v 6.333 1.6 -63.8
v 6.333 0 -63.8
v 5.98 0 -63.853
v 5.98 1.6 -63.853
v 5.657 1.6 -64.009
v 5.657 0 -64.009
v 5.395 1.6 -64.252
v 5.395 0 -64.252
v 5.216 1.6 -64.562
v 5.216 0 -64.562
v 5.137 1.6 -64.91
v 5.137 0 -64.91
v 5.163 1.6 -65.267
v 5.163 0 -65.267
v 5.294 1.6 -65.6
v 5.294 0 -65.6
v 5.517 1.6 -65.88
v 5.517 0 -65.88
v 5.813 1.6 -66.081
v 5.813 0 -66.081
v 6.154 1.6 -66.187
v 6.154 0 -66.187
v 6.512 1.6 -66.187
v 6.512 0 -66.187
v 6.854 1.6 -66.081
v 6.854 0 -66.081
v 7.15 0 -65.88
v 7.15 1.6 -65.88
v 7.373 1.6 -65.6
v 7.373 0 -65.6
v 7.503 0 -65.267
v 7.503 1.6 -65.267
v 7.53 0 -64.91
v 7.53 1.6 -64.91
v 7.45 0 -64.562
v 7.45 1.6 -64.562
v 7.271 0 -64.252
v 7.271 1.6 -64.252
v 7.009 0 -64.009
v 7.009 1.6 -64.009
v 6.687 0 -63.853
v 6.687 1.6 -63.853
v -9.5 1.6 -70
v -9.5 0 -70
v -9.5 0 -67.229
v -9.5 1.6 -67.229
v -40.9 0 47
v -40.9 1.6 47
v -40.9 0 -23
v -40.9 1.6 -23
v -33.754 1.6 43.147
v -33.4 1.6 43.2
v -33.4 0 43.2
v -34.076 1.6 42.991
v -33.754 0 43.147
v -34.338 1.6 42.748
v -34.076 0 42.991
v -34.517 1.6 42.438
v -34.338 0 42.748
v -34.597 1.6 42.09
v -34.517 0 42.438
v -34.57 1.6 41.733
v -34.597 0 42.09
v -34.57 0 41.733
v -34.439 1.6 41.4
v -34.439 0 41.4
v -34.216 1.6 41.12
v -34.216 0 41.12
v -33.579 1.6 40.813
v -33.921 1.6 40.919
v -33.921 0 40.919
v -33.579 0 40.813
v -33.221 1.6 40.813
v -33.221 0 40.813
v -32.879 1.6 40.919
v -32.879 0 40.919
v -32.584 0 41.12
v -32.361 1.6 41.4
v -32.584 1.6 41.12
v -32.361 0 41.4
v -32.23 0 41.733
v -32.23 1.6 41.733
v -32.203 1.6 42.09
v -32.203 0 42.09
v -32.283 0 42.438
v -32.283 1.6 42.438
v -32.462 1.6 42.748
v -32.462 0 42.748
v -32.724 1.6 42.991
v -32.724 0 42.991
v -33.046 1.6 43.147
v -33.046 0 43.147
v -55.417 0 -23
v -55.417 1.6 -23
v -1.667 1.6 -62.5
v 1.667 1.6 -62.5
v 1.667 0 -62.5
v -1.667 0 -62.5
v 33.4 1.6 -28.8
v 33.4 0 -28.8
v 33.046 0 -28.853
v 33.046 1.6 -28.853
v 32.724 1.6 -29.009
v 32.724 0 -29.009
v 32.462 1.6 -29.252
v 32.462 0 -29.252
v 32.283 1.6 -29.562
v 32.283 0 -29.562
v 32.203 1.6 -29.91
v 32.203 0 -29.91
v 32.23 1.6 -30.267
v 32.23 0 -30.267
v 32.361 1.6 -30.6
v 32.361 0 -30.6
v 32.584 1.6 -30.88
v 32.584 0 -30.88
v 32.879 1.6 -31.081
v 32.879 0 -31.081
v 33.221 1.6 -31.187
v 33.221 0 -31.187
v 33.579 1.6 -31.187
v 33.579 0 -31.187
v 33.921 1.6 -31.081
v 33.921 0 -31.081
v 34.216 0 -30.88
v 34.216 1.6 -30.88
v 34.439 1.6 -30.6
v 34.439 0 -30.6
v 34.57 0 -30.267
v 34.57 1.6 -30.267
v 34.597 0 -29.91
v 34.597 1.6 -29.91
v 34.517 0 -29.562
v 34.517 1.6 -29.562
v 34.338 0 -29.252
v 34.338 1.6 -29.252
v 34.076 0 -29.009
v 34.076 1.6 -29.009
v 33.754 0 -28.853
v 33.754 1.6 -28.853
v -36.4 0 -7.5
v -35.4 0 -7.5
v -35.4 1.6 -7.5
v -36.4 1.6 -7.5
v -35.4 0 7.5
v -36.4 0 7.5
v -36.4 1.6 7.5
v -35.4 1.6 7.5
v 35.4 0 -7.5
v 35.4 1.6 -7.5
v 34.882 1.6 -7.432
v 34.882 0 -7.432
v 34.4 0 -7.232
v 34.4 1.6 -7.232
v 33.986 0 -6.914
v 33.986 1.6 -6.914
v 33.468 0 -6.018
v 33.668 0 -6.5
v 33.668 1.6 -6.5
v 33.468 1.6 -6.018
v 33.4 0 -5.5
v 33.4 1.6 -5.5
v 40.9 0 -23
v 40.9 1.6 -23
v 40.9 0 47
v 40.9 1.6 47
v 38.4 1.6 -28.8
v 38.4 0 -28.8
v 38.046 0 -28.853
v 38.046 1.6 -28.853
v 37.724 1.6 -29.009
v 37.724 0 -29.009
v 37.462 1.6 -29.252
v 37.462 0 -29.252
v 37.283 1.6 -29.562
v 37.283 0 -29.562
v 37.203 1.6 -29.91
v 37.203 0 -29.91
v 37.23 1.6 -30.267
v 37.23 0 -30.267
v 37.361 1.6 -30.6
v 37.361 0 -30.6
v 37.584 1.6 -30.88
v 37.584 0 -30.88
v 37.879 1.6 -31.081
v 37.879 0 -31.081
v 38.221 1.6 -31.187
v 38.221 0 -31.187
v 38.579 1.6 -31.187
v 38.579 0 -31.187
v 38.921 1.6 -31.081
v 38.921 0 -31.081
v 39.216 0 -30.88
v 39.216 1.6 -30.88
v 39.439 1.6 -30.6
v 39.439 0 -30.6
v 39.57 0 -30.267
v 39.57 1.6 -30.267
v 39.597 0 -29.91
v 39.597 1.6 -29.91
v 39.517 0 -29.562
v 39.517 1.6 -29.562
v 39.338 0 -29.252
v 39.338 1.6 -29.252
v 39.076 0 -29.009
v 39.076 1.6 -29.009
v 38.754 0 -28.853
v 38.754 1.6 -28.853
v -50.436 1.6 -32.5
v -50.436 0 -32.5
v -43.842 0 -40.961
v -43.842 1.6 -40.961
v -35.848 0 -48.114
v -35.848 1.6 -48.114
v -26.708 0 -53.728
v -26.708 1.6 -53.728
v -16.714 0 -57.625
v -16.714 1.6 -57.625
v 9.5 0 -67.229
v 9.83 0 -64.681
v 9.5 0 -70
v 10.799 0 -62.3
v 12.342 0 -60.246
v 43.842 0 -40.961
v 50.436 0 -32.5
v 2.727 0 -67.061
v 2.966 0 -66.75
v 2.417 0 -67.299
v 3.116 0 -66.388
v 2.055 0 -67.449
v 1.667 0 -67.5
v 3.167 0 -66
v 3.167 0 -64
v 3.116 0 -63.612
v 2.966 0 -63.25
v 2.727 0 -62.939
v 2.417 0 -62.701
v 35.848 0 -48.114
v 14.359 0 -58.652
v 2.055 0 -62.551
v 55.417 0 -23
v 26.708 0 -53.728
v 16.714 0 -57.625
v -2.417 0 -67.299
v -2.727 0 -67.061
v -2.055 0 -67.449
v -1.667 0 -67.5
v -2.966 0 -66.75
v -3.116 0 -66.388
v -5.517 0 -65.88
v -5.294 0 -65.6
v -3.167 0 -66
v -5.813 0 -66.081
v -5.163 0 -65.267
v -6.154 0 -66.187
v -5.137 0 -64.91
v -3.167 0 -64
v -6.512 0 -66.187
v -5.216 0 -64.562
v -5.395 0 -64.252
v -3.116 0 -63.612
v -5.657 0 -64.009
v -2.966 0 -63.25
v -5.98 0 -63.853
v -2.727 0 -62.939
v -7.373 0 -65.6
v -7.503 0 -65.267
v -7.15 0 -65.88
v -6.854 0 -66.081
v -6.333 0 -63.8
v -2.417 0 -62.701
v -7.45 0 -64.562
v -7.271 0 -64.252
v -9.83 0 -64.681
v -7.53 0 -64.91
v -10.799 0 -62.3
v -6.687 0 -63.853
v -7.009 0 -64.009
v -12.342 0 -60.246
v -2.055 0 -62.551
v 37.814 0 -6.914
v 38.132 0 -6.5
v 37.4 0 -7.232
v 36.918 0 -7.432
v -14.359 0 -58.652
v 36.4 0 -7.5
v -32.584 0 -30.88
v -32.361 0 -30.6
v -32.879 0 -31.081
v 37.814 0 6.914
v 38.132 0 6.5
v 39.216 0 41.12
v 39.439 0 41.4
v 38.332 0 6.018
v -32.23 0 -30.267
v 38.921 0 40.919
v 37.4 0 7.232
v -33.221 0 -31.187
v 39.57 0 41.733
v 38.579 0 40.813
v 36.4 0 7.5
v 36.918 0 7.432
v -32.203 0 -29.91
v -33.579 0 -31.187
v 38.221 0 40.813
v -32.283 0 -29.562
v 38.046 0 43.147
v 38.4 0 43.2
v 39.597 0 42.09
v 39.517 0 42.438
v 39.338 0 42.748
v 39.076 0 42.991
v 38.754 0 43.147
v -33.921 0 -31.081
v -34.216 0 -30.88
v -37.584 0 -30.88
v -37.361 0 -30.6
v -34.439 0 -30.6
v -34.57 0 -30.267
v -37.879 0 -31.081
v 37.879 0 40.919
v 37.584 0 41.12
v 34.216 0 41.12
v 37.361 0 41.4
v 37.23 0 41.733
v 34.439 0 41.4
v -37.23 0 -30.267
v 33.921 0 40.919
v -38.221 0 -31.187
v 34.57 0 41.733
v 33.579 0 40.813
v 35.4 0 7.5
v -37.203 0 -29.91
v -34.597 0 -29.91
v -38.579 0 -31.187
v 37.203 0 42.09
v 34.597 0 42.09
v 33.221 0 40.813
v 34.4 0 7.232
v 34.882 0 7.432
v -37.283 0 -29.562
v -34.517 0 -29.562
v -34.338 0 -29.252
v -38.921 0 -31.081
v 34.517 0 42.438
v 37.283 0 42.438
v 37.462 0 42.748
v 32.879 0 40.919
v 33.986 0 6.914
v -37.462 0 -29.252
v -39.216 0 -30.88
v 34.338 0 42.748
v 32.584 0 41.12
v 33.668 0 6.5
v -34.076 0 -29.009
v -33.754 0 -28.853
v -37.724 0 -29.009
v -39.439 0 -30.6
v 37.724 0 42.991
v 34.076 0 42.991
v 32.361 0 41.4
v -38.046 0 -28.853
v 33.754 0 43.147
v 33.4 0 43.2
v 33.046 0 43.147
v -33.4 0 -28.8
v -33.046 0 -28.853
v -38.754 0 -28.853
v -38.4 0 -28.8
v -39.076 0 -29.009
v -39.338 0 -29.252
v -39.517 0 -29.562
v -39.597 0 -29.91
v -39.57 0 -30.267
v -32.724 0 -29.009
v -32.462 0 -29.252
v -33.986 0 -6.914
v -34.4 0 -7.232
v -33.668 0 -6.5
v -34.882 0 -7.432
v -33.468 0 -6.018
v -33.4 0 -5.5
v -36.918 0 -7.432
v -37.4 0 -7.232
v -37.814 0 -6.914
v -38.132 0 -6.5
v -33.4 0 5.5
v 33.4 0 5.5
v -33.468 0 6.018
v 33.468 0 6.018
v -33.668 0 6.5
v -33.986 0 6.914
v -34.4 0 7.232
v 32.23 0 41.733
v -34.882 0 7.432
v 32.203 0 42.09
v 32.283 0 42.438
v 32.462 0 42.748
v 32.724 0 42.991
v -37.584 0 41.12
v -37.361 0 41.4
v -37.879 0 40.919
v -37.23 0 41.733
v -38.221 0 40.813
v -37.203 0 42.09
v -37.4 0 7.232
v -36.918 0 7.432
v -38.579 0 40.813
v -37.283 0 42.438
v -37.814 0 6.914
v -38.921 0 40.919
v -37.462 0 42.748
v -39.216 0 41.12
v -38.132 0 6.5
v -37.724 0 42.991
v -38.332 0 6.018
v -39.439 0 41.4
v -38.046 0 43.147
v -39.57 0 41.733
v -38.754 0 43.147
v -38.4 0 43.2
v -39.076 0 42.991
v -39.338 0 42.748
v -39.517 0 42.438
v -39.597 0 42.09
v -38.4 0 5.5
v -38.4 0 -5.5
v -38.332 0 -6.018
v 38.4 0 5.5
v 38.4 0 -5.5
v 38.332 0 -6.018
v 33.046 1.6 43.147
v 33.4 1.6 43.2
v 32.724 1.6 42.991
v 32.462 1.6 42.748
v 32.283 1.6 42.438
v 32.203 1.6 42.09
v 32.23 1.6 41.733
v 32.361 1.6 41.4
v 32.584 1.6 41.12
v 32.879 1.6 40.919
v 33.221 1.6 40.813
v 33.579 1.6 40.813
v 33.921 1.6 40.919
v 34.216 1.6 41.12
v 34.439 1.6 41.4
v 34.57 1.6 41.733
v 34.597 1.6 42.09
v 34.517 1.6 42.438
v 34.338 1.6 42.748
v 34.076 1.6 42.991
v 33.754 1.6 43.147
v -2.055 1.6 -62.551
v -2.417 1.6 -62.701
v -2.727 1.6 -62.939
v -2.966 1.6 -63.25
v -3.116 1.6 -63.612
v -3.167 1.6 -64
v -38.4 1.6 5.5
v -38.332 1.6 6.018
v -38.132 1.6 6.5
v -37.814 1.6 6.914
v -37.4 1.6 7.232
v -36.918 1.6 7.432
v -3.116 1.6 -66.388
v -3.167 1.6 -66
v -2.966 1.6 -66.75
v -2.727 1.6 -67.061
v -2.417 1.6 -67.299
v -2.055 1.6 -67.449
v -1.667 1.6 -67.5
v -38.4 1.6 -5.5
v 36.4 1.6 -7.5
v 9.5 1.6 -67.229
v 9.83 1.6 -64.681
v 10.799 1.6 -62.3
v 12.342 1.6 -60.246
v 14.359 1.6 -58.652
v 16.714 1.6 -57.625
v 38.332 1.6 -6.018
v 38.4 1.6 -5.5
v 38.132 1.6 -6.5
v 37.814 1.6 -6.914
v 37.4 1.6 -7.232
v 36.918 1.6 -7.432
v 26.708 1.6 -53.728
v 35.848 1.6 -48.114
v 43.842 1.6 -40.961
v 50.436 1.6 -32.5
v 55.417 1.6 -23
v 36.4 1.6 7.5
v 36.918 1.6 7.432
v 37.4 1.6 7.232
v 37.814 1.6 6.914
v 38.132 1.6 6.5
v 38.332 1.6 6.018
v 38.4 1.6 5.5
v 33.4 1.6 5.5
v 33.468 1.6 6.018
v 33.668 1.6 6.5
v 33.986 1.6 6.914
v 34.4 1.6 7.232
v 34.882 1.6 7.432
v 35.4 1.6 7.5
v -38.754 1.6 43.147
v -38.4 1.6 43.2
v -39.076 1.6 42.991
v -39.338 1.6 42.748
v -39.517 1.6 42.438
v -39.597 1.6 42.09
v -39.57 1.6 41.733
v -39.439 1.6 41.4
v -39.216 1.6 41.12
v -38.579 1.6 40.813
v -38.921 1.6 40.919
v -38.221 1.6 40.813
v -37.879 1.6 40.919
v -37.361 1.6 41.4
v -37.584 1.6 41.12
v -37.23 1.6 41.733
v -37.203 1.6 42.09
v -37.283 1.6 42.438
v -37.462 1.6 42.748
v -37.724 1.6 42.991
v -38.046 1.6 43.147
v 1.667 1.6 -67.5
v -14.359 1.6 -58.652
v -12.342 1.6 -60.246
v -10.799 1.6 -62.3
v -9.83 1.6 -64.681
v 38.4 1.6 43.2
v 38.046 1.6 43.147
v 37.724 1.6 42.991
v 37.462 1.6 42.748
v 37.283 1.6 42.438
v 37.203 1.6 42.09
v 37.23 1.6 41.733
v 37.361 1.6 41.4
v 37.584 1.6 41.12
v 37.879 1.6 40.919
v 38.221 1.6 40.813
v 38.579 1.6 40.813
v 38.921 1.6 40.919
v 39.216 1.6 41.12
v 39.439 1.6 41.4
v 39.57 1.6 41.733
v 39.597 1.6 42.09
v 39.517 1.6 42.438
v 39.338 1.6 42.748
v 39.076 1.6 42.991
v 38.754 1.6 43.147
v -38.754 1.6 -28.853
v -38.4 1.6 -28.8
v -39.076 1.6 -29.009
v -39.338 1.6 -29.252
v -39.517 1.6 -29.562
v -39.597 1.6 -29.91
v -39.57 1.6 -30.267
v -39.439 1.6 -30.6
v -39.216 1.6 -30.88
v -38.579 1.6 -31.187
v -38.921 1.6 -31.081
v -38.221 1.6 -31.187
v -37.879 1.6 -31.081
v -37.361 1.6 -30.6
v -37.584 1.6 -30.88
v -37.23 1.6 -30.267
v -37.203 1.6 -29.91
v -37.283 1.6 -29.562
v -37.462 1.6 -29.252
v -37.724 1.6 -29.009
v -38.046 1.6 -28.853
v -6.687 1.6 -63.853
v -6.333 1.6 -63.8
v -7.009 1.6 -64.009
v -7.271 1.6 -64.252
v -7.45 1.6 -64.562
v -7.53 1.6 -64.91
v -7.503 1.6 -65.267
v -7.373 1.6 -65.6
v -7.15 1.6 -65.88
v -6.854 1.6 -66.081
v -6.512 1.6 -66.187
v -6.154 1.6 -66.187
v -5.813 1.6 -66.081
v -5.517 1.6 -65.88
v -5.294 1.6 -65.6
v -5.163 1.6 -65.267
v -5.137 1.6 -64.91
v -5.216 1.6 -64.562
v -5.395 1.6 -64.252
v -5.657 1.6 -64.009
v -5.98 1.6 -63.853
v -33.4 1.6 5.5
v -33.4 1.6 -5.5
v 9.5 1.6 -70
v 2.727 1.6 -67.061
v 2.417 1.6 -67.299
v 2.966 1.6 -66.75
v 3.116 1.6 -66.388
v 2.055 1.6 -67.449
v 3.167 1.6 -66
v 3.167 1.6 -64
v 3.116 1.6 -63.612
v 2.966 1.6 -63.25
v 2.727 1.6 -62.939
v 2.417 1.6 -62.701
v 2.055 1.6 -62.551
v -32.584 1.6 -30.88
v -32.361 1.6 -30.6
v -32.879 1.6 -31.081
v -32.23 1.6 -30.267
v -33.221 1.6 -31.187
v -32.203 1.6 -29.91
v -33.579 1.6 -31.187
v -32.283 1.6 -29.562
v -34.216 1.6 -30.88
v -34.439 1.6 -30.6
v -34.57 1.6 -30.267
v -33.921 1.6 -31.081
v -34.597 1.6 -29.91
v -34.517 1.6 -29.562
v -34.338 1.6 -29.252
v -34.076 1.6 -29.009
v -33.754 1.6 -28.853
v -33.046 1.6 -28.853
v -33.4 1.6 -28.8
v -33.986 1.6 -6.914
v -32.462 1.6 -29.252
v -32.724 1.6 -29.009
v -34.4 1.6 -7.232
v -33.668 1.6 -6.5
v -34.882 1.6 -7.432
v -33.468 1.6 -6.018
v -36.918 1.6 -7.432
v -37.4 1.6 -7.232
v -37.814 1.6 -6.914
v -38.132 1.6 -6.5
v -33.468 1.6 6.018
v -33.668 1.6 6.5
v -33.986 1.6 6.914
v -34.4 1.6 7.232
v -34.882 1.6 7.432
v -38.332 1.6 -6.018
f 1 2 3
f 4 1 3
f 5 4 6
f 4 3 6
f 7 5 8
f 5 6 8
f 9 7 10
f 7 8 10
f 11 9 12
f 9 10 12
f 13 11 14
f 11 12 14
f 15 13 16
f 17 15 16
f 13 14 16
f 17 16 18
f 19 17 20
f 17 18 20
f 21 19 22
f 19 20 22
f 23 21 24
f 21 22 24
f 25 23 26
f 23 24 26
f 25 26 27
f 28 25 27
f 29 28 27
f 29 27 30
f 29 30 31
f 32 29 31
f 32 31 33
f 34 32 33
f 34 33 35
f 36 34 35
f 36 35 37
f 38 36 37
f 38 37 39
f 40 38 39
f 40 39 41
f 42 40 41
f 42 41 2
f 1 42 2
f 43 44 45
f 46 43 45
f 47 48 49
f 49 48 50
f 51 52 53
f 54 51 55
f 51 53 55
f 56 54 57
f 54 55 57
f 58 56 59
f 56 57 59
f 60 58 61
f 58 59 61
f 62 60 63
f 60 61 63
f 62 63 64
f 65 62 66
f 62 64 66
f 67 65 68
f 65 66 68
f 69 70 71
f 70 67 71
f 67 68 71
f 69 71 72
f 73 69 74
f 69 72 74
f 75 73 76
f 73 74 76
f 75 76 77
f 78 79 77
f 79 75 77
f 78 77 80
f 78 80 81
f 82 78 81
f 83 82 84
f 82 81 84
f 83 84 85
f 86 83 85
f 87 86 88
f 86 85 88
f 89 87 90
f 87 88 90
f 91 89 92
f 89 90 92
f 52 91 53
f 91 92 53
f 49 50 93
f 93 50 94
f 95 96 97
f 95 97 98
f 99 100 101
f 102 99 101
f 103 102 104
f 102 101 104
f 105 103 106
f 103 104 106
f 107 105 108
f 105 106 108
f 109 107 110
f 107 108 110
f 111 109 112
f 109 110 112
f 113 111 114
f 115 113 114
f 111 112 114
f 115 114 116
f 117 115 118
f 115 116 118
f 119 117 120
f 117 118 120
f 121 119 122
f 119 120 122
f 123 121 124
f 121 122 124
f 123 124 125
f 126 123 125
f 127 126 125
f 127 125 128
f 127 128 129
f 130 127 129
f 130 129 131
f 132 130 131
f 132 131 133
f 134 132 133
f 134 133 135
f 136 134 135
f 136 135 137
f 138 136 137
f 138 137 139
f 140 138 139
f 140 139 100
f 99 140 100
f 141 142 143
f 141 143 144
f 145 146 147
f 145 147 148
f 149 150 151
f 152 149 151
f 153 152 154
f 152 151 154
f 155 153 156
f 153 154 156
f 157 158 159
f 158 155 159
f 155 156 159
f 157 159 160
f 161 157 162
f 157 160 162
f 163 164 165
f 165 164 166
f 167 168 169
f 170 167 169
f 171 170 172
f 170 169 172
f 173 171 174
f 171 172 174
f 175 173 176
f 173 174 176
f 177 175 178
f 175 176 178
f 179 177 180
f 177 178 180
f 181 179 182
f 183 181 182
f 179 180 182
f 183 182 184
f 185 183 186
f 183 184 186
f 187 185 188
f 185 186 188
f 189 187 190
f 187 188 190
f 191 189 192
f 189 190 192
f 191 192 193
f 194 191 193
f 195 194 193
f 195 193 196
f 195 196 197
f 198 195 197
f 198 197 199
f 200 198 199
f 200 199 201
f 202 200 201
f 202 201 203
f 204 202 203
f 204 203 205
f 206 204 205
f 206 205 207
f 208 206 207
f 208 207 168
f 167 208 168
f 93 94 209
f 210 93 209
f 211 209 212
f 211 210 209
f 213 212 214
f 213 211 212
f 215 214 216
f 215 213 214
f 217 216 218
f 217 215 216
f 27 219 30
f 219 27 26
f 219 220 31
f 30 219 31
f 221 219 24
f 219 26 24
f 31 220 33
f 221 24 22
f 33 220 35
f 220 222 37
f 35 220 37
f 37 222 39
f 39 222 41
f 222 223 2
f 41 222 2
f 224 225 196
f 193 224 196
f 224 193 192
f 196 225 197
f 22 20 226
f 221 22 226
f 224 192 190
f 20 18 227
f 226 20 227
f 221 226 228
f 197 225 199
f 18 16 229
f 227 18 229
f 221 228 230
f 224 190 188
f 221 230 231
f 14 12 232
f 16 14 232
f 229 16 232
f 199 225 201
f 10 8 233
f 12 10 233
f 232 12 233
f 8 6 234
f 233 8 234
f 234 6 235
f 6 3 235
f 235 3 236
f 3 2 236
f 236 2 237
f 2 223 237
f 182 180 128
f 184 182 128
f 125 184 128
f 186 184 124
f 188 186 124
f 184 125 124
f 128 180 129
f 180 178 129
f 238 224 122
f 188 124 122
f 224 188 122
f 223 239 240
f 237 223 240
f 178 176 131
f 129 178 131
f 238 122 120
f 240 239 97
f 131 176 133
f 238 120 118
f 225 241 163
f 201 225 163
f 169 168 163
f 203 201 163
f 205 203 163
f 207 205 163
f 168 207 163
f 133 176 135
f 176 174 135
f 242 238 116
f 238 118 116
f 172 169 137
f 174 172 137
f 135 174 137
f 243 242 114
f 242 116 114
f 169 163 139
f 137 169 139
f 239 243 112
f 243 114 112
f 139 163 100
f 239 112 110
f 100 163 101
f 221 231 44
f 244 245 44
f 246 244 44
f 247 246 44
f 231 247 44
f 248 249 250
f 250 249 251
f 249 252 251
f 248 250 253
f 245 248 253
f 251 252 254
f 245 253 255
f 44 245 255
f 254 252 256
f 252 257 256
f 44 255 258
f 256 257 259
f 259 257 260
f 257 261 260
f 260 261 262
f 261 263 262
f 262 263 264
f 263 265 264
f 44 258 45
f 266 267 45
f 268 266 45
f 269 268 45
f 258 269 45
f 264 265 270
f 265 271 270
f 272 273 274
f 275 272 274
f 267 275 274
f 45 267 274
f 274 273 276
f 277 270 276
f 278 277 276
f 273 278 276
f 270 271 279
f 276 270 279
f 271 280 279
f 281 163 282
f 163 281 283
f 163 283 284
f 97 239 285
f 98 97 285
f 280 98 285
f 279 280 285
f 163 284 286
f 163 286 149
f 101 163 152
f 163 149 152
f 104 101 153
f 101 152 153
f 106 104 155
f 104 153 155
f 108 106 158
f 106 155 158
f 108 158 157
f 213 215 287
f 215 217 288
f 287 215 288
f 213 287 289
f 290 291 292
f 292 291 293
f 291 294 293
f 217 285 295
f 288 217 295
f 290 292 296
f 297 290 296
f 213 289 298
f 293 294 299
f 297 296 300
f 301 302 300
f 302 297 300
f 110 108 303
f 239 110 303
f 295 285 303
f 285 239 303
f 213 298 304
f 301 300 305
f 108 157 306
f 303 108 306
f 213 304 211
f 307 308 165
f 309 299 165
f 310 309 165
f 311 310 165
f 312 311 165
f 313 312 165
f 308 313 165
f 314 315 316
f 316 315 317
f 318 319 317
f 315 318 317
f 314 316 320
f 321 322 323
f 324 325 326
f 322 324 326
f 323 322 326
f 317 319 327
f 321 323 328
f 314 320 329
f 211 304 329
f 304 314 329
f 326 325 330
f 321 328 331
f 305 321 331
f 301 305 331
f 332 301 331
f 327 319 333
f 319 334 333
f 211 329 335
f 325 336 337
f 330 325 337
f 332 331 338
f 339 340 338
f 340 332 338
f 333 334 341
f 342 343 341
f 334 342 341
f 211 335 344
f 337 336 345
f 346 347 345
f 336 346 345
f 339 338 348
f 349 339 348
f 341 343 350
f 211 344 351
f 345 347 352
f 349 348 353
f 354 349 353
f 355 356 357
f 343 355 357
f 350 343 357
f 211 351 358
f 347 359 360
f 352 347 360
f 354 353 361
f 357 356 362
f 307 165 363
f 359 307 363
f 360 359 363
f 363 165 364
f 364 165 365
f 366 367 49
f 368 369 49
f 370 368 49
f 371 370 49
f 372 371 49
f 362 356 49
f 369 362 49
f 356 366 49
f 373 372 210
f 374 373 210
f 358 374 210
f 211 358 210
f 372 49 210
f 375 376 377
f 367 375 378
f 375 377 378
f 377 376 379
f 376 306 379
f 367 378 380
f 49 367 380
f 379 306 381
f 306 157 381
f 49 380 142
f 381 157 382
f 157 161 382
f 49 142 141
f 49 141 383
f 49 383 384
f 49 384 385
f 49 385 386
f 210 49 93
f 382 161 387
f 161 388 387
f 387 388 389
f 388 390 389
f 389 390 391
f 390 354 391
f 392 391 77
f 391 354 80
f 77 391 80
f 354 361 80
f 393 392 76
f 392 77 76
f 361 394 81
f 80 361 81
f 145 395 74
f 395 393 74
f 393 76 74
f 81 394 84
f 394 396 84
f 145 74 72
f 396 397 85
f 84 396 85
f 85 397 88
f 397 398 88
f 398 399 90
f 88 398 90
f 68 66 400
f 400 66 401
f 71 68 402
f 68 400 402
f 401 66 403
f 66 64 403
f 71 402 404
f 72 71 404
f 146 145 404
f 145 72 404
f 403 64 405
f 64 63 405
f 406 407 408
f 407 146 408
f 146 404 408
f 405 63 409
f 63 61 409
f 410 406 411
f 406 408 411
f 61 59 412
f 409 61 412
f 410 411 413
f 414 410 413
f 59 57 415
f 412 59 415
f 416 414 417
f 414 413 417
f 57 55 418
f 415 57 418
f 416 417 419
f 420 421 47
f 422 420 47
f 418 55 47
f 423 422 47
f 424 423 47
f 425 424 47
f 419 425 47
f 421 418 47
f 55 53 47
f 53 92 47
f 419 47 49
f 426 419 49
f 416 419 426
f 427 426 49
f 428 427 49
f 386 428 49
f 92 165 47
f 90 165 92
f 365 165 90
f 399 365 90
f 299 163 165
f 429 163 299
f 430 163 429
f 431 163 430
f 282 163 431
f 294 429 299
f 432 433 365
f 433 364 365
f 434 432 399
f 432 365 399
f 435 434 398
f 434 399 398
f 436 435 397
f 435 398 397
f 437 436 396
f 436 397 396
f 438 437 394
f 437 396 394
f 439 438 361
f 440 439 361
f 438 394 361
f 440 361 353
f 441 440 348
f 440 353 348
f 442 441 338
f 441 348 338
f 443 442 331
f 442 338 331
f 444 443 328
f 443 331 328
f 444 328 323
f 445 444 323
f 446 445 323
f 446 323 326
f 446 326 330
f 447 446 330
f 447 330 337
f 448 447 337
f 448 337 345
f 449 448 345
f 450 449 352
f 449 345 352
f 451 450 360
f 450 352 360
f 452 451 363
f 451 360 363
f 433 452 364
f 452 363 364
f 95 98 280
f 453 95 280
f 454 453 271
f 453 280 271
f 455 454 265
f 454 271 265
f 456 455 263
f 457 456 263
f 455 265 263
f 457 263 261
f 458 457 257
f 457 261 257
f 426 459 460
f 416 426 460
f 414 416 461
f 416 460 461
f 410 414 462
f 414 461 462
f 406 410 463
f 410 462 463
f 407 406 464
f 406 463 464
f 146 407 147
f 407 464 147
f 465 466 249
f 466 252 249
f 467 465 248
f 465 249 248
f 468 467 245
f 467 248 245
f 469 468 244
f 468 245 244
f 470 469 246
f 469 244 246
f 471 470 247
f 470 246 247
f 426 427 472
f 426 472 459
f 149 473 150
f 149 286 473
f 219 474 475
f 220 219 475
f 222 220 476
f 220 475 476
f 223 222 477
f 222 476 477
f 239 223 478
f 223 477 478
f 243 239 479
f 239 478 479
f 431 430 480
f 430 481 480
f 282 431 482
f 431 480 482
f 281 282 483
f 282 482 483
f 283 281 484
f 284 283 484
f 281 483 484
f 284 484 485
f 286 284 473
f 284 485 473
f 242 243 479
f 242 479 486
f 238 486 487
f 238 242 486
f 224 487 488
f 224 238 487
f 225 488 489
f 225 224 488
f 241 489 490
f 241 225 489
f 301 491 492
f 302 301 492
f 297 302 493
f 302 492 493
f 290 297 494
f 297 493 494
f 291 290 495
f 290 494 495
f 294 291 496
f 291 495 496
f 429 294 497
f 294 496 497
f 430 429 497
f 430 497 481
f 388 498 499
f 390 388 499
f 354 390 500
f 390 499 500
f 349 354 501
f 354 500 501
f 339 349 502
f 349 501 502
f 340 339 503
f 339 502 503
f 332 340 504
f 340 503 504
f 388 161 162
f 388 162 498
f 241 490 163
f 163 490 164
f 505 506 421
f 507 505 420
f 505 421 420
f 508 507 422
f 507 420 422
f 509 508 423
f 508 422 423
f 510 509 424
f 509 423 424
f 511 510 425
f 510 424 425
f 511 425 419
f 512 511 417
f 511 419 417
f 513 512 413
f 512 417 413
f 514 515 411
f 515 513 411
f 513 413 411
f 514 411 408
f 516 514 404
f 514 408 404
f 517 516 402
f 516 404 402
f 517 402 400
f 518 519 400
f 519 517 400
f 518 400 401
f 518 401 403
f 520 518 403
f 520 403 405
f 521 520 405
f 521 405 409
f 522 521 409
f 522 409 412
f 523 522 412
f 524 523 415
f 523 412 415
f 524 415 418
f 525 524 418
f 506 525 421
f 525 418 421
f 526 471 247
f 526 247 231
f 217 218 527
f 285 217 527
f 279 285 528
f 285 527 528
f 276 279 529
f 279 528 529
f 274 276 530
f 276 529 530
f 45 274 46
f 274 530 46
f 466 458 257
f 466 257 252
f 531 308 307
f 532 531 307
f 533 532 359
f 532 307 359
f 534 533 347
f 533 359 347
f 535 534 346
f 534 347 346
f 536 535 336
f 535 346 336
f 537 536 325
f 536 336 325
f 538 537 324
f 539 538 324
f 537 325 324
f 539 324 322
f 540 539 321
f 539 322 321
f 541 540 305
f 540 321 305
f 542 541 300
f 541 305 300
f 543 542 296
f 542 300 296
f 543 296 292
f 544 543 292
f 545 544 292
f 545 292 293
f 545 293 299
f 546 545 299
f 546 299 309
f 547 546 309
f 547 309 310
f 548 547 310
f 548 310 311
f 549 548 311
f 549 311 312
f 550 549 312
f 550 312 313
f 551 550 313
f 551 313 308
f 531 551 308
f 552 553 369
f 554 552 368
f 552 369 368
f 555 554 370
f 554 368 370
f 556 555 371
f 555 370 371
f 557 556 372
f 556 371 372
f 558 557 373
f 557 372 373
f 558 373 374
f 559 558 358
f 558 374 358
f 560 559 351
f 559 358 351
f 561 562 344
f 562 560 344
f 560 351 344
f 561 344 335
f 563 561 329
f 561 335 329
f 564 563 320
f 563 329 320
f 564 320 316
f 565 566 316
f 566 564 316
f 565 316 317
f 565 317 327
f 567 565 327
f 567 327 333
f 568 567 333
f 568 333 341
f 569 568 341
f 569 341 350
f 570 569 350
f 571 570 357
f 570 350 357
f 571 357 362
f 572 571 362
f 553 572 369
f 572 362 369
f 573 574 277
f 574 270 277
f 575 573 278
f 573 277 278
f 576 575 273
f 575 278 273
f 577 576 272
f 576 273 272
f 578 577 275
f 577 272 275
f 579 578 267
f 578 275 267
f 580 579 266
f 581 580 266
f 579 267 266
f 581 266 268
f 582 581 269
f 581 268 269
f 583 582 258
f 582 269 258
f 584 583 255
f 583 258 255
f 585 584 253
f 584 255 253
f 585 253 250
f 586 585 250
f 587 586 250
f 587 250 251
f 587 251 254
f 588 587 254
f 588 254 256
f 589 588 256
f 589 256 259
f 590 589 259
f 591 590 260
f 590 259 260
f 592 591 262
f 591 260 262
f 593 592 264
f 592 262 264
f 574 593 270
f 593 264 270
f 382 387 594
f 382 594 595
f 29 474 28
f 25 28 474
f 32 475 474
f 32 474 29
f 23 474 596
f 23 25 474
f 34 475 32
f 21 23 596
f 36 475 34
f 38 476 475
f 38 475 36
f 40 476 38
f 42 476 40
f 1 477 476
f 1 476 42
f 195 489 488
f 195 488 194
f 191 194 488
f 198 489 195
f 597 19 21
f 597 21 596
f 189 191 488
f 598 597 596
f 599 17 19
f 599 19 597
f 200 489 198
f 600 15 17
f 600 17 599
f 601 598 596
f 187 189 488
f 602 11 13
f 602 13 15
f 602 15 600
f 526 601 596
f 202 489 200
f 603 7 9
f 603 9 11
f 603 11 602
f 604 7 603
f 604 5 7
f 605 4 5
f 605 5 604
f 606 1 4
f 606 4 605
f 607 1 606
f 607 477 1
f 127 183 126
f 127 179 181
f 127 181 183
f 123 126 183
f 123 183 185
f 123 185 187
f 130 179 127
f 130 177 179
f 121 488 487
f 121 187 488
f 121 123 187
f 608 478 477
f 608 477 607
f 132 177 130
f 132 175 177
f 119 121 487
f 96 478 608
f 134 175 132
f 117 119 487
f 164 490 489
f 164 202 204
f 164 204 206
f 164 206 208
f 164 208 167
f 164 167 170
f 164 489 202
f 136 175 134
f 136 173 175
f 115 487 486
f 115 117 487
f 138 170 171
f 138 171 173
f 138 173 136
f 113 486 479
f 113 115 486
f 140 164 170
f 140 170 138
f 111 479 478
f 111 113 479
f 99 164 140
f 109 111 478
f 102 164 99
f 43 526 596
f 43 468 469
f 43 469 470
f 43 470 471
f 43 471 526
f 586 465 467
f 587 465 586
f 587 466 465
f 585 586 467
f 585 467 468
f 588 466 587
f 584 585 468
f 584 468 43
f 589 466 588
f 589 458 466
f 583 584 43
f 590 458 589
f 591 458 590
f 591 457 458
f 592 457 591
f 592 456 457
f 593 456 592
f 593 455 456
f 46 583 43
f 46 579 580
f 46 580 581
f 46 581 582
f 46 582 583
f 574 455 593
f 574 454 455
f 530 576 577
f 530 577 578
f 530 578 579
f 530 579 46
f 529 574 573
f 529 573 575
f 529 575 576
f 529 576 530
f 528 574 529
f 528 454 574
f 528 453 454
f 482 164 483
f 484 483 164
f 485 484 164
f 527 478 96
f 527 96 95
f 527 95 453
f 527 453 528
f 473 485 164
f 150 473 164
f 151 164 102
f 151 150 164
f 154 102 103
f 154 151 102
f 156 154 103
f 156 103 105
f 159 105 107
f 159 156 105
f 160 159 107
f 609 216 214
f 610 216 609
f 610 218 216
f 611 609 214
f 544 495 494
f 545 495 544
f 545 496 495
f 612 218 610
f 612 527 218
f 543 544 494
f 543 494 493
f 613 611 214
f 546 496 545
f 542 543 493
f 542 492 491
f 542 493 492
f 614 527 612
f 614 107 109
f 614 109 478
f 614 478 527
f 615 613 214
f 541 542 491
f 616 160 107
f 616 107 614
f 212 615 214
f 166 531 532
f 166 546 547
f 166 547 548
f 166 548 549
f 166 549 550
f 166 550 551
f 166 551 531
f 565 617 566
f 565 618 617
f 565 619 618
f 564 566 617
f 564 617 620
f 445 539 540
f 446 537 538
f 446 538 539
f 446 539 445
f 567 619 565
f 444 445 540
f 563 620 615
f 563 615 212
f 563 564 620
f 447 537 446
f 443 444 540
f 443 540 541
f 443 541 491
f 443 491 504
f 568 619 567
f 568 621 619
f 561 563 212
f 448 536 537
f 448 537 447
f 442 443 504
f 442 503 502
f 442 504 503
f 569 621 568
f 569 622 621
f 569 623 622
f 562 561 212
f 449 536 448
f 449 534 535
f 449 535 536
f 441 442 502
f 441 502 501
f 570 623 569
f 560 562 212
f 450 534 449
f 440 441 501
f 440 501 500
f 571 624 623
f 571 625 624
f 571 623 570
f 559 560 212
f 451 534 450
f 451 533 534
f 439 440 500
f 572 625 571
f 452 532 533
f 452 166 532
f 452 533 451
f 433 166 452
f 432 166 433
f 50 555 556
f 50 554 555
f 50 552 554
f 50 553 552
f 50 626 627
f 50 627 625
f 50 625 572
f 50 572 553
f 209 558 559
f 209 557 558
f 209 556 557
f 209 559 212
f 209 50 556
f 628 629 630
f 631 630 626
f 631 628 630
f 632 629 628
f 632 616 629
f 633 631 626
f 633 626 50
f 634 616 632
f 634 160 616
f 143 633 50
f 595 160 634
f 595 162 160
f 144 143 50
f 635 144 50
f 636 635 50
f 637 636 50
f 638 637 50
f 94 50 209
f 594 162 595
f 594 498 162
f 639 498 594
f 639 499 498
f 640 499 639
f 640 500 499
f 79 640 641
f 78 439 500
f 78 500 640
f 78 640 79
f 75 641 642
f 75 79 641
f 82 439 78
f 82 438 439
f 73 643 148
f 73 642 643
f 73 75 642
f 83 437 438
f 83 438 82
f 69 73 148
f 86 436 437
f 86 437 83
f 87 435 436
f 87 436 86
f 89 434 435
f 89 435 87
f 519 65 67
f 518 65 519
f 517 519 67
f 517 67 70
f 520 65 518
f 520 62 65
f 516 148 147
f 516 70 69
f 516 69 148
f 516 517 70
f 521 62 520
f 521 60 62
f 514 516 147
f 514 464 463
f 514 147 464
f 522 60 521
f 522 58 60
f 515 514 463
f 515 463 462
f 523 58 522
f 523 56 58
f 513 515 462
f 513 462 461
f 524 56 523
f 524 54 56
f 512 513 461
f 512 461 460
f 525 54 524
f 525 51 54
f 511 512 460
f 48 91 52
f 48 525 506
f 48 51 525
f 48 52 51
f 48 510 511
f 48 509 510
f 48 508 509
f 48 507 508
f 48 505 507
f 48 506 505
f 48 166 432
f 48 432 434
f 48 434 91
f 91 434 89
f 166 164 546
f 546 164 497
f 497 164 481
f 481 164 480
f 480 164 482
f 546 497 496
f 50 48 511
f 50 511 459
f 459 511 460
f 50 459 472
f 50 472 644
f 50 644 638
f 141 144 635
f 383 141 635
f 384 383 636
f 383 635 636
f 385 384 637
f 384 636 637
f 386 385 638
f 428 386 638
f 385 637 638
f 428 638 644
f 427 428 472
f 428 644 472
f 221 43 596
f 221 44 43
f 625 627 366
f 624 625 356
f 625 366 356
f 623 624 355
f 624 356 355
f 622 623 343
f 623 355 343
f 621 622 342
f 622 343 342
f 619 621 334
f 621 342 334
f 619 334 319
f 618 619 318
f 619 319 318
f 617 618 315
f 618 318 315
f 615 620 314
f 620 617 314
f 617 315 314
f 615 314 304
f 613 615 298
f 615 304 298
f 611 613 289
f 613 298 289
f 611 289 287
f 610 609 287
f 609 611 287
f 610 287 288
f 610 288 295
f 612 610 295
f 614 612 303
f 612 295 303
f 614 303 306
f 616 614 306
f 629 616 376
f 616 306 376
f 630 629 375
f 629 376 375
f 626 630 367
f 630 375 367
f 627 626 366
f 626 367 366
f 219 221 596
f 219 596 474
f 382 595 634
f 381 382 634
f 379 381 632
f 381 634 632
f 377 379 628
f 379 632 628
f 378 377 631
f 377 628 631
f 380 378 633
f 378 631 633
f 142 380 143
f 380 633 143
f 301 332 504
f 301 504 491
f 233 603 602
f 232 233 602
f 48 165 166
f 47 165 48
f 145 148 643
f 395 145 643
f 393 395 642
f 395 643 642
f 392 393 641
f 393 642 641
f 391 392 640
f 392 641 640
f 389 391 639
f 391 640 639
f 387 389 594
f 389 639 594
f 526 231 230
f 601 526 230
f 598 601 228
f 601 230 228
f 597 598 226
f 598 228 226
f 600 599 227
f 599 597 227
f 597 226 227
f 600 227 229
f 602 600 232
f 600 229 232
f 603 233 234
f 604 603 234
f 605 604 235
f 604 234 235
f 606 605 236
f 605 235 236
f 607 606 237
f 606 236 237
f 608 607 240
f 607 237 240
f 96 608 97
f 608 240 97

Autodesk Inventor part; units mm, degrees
ref_plane "YZ Plane" through (0, 0, 0) normal (1, 0, 0) x (0, 1, 0)
ref_plane "XZ Plane" through (0, 0, 0) normal (0, 1, 0) x (-1, 0, 0)
ref_plane "XY Plane" through (0, 0, 0) normal (0, 0, 1) x (1, 0, 0)
sketch "スケッチ1" plane through (0, 0, 0) normal (0, 1, 0) x (-1, 0, 0)
  circle A0 centre (0, 0) radius 60
  line L0 (60, 0) -> (-60, 0)
  line L1 (-60, 0) -> (-60, 47)
  line L2 (-60, 47) -> (60, 47)
  line L3 (60, 47) -> (60, 0)
  line L4 (9.5, -70) -> (9.5, -59.2431)
  line L5 (-9.5, -70) -> (-9.5, -59.2431)
  line L6 (9.5, -70) -> (-9.5, -70)
  line L7 (0, -70) -> (0, -60)
  point P0 (37.2961, 47)
  point P1 (3.75, -60.165)
  point P2 (-3.75, -60.165)
  point P3 (-37.2961, 47)
  dimension "d41" = 120
  dimension "d70" = 60.165
  dimension "d71" = 7.5
  dimension "d72" = 3.75
  dimension "d88" = 47
  dimension "d147" = 19
  dimension "d148" = 10
extrude "押し出し1" add sketch "スケッチ1" along normal blind 1.6 contours L0 A0 | L1 L2 A0 | A0 L2 L0 | A0 L7 L6 L5 | A0 L2 L3 | A0 L4 L6 L7
sketch "スケッチ6" plane through (0, 1.6, 0) normal (0, 1, 0) x (-1, 0, 0)
  line L0 (-33.4, -30) -> (-33.4, 42) construction
  line L1 (-33.4, 42) -> (-38.4, 42) construction
  line L2 (-38.4, 42) -> (-38.4, -30) construction
  line L3 (-33.4, 12) -> (-38.4, 12) construction
  line L4 (-40.9, 21.5) -> (-40.9, -18.5) construction
  line L5 (-33.4, -30) -> (-38.4, -30) construction
  line L6 (-42.5, 20) -> (-42.5, -20) construction
  point P0 (0, 0)
  point P1 (-35.9, 0)
  dimension "d52" = 5
  dimension "d53" = 72
  dimension "d54" = 30
  dimension "d55" = 2.5
  dimension "d68" = 33.4
  dimension "d69" = 12
  dimension "d100" = 30
hole "穴3" at (33.4, 1.6, 42) at (38.4, 1.6, 42) at (38.4, 1.6, -30) at (33.4, 1.6, -30) at (35.9, 1.6, 0) direction (0, -1, 0) diameter 2.4 end through all clearance for "Countersunk Flat Head Screw ISO 2009/7046" size "M2" standard "ISO"
mirror "ミラー2" about plane through (0, 0, 0) normal (1, 0, 0) of "穴3"
sketch "スケッチ9" plane through (0, 1.6, 0) normal (0, 1, 0) x (1, 0, 0)
  line L0 (-40.9, 23) -> (-70.9, 23)
  line L1 (-70.9, 23) -> (-70.9, -32)
  line L2 (-70.9, -32) -> (-40.9, -32)
  line L3 (-40.9, -32) -> (-40.9, 23)
  line L4 (-60, 0) -> (-60, -47) projected
  line L5 (-60, -47) -> (60, -47) projected
  line L6 (-40.9, -32) -> (-70.9, -32)
  line L7 (-70.9, -32) -> (-70.9, -49)
  line L8 (-70.9, -49) -> (-40.9, -49)
  line L9 (-40.9, -49) -> (-40.9, -32)
  point P0 (0, 0)
  point P1 (-40.9, -47)
  point P2 (-60, -32)
  dimension "d84" = 55
  dimension "d89" = 23
  dimension "d90" = 40.9
  dimension "d91" = 30
  dimension "d92" = 17
extrude "押し出し2" cut sketch "スケッチ9" against normal blind 10 contours L3 L2 L1 L0 | L9 L5 L4 L2
mirror "ミラー3" about plane through (0, 0, 0) normal (1, 0, 0) of "押し出し2"
sketch "スケッチ12" plane through (0, 1.6, 0) normal (0, 1, 0) x (1, 0, 0)
  line L0 (-56.8017, 16.1133) -> (59.6732, 16.1133) construction
  line L1 (59.6732, 16.1133) -> (59.6732, -15.1509) construction
  line L2 (59.6732, -15.1509) -> (-56.8017, -15.1509) construction
  line L3 (-56.8017, -15.1509) -> (-56.8017, 16.1133) construction
  point P0 (0, 0)
sketch "スケッチ13" plane through (0, 1.6, 0) normal (0, 1, 0) x (1, 0, 0)
  point P0 (0, 0)
fillet "フィレット1" radius 10 2 edges at (9.5, 0.8, -59.2431) (-9.5, 0.8, -59.2431)
sketch "スケッチ16" plane through (0, 0, 0) normal (0, -1, 0) x (1, 0, 0)
  circle A0 centre (-35.9, 0) radius 1.2 projected
  line L0 (-33.4, -7.5) -> (-38.4, -7.5)
  line L1 (-38.4, -7.5) -> (-38.4, 7.5)
  line L2 (-38.4, 7.5) -> (-33.4, 7.5)
  line L3 (-33.4, 7.5) -> (-33.4, -7.5)
  line L4 (-33.4, -7.5) -> (-38.4, 7.5) construction
  line L5 (-33.4, 7.5) -> (-38.4, -7.5) construction
  point P0 (0, 0)
  point P1 (-35.9, 0)
  dimension "d120" = 5
  dimension "d121" = 15
extrude "押し出し4" cut sketch "スケッチ16" against normal blind 10
fillet "フィレット2" radius 2 4 edges at (-33.4, 0.8, -7.5) (-33.4, 0.8, 7.5) (-38.4, 0.8, 7.5) (-38.4, 0.8, -7.5)
mirror "ミラー5" about plane through (0, 0, 0) normal (1, 0, 0) of "押し出し4", "フィレット2"
sketch "スケッチ21" plane through (0, 1.6, 0) normal (0, 1, 0) x (1, 0, 0)
  line L0 (9.5, 72.5) -> (-9.5, 72.5) projected
  line L1 (-9.5, 70) -> (9.5, 70)
  line L2 (9.5, 70) -> (9.5, 60)
  line L3 (9.5, 60) -> (-9.5, 60)
  line L4 (-9.5, 60) -> (-9.5, 70)
  line L5 (0, 70) -> (0, 67.5)
  line L6 (-3.1667, 67.5) -> (0, 67.5)
  line L7 (0, 62.5) -> (-3.1667, 62.5)
  line L8 (-3.1667, 62.5) -> (-3.1667, 67.5)
  circle A0 centre (-6.3333, 65) radius 1.5833
  line L9 (0, 65) -> (-1.5833, 65) construction
  line L10 (-1.5833, 65) -> (-3.1667, 65) construction
  line L11 (-3.1667, 65) -> (-4.75, 65) construction
  line L12 (-4.75, 65) -> (-6.3333, 65) construction
  line L13 (-6.3333, 65) -> (-7.9167, 65) construction
  line L14 (-7.9167, 65) -> (-9.5, 65) construction
  line L15 (3.1667, 67.5) -> (0, 67.5)
  line L16 (0, 62.5) -> (3.1667, 62.5)
  line L17 (3.1667, 62.5) -> (3.1667, 67.5)
  circle A1 centre (6.3333, 65) radius 1.5833
  line L18 (0, 65) -> (0, 62.5)
  line L19 (0, 67.5) -> (0, 65)
  line L20 (0, 62.5) -> (0, 60)
  point P0 (0, 0)
  dimension "d146" = 10
extrude "押し出し7" cut sketch "スケッチ21" against normal blind 1.6 contours L19 L18 L7 L8 L6 | L15 L17 L16 L18 L19
sketch "スケッチ22" plane through (0, 1.6, 0) normal (0, 1, 0) x (1, 0, 0)
  line L0 (-3.1667, 67.5) -> (-3.1667, 62.5) projected
  line L1 (-3.1667, 65) -> (-9.5, 65)
  line L2 (-9.5, 70) -> (-9.5, 67.2291) projected
  line L3 (-3.1667, 67.5) -> (3.1667, 67.5) projected
  line L4 (0, 67.5) -> (0, 65.9167)
  point P0 (0, 0)
  point P1 (-6.3333, 65)
  point P2 (6.3333, 65)
hole "穴8" at (-6.3333, 1.6, -65) at (6.3333, 1.6, -65) direction (0, -1, 0) diameter 2.4 end through all clearance for "Countersunk Flat Head Screw ISO 2009/7046" size "M2" standard "ISO"
fillet "フィレット5" radius 1.5 4 edges at (-3.1667, 0.8, -67.5) (-3.1667, 0.8, -62.5) (3.1667, 0.8, -62.5) (3.1667, 0.8, -67.5)
ref_plane "作業平面5" through (0, 0, -23) normal (1, 0, 0) x (0, 0, -1)
properties part number "flame" material "エポキシ樹脂"
